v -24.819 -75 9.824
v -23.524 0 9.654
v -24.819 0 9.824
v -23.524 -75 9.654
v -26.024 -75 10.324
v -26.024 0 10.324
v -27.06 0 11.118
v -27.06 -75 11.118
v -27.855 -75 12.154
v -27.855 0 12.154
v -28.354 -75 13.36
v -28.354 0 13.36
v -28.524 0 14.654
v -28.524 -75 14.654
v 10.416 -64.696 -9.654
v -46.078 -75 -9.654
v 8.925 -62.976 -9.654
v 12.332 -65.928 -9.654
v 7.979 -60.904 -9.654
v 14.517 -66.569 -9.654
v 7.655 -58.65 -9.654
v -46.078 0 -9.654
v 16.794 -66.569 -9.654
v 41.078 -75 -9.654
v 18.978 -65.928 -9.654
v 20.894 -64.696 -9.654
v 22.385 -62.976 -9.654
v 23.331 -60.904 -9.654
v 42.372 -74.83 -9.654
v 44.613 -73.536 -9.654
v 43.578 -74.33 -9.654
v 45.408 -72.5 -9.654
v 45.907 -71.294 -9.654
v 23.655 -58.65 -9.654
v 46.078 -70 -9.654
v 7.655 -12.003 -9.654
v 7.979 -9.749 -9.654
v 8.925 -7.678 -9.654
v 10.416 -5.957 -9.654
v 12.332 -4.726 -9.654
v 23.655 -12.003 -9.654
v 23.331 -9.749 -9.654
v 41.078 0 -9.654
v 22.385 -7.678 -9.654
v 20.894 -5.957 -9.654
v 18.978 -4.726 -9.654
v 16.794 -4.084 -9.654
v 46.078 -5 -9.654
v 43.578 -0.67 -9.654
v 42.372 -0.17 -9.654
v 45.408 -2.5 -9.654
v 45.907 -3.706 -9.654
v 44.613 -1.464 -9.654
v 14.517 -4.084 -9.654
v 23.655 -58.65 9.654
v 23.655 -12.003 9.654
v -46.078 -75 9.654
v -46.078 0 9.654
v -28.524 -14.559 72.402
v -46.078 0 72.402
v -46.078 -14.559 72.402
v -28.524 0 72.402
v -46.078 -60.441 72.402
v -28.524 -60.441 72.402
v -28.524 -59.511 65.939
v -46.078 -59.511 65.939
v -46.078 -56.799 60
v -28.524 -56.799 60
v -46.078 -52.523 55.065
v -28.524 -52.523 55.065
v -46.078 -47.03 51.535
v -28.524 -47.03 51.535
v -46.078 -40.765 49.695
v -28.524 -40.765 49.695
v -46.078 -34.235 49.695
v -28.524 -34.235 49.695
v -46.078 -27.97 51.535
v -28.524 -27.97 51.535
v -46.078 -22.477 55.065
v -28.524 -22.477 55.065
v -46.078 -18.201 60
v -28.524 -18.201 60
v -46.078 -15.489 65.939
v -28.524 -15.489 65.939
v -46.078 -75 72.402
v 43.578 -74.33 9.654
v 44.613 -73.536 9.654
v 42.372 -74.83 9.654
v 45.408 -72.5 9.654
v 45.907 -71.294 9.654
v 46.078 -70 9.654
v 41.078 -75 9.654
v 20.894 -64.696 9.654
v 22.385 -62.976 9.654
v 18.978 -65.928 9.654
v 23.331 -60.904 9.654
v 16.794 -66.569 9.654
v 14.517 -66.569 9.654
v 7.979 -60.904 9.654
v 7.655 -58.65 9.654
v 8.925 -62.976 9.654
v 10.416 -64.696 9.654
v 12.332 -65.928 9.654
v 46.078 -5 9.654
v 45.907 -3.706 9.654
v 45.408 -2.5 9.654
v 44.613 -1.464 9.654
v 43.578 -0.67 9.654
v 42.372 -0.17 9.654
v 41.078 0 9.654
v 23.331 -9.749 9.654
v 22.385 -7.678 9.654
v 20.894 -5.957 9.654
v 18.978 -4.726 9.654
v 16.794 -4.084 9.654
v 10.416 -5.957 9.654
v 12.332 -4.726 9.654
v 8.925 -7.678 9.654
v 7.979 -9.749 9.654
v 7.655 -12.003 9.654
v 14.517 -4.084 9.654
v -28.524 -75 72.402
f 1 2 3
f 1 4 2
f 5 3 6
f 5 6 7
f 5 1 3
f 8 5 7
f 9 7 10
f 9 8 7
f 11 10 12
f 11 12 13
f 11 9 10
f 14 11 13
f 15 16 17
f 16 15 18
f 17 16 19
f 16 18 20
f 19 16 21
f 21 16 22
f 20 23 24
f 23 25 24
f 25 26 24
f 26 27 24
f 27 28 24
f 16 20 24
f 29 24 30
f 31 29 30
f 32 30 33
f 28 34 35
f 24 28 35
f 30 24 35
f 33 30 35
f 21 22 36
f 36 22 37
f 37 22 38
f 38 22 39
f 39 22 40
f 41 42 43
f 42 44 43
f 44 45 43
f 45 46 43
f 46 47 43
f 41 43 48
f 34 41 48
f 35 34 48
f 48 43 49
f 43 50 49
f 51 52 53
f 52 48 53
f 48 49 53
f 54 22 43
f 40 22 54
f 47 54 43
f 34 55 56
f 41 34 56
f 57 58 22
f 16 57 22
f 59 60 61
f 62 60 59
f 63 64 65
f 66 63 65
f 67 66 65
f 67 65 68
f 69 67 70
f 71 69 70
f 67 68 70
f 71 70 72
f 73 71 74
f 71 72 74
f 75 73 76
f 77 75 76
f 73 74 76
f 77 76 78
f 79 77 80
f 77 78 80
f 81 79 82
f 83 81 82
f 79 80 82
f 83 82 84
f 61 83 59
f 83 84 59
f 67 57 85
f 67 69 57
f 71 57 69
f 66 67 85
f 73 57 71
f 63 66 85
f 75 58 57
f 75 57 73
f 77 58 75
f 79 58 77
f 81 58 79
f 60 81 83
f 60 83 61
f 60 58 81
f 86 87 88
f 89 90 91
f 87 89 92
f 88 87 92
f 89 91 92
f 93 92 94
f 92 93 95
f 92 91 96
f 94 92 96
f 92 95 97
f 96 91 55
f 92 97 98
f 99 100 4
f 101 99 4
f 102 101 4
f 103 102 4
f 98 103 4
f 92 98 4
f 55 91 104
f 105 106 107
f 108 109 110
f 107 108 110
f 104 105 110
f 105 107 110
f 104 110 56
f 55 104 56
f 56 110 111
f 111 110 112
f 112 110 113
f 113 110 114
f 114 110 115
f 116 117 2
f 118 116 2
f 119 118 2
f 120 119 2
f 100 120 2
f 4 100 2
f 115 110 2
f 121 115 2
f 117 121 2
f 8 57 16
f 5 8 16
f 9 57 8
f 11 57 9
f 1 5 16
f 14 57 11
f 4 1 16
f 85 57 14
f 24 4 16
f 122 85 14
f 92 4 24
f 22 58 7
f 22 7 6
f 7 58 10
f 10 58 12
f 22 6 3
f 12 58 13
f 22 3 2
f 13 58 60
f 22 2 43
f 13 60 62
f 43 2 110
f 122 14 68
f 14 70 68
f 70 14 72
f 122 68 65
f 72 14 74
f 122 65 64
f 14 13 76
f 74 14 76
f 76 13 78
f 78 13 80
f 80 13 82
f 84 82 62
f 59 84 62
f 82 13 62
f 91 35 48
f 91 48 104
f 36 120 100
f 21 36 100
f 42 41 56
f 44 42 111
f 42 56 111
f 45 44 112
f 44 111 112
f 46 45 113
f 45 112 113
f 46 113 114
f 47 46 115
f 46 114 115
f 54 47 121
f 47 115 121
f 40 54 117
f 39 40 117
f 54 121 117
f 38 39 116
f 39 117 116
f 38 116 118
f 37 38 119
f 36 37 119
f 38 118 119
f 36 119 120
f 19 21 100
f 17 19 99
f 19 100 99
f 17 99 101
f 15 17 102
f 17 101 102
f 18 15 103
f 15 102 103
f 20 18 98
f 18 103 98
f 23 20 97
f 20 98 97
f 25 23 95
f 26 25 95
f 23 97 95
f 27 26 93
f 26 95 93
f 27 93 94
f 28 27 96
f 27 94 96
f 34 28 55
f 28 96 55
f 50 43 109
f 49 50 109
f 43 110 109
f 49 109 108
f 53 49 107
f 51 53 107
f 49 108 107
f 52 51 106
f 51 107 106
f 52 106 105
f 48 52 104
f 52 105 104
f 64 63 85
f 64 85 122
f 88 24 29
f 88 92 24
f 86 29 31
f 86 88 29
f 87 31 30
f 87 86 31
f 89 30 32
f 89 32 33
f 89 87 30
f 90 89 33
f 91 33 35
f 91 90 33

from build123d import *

# Parameters (mm, degrees)
F0_W     = 17.553337
F0_H     = 62.748581
F1_DEPTH = 75
F2_R     = 22.940745
F3_DEPTH = 25
F5_DEPTH = 19.308256
F6_R     = 5
F7_R     = 5


with BuildPart() as f1:
    # F0 (on Front) → F1 (new body)
    with BuildSketch(Plane.XZ):
        Polygon((-46.077821, -9.653628), (46.077821, -9.653628), (46.077821, 9.653628), (-28.524484, 9.653628), (-46.077821, 9.653628), align=None)
        with Locations((-37.301153, 41.027918)):
            Rectangle(F0_W, F0_H)
    extrude(amount=F1_DEPTH)

    # F2 (on face) → F3 (cut)
    with BuildSketch(Plane.YZ.offset(-28.524484)):
        with Locations((-37.5, 72.402209)):
            Circle(F2_R)
    extrude(amount=-F3_DEPTH, mode=Mode.SUBTRACT)

    # F4 (on face) → F5 (cut, through all)
    with BuildSketch(Plane.XY.offset(9.653628)):
        with BuildLine():
            Line((7.655139, -12.002843), (7.655139, -58.650463))
            ThreePointArc((7.655139, -58.650463), (15.655139, -66.650463), (23.655139, -58.650463))
            Line((23.655139, -58.650463), (23.655139, -12.002843))
            ThreePointArc((23.655139, -12.002843), (15.655139, -4.002843), (7.655139, -12.002843))
        make_face()
    extrude(amount=-F5_DEPTH, mode=Mode.SUBTRACT)

    # F6
    f6_edges = [f1.edges().sort_by_distance(p)[0] for p in [
        (46.077821, -75, 0),
        (46.077821, 0, 0),
    ]]
    fillet(f6_edges, radius=F6_R)

    # F7
    f7_edges = [f1.edges().sort_by_distance(p)[0] for p in [
        (-28.524484, -37.5, 9.653628),
    ]]
    fillet(f7_edges, radius=F7_R)


solid = f1.part
